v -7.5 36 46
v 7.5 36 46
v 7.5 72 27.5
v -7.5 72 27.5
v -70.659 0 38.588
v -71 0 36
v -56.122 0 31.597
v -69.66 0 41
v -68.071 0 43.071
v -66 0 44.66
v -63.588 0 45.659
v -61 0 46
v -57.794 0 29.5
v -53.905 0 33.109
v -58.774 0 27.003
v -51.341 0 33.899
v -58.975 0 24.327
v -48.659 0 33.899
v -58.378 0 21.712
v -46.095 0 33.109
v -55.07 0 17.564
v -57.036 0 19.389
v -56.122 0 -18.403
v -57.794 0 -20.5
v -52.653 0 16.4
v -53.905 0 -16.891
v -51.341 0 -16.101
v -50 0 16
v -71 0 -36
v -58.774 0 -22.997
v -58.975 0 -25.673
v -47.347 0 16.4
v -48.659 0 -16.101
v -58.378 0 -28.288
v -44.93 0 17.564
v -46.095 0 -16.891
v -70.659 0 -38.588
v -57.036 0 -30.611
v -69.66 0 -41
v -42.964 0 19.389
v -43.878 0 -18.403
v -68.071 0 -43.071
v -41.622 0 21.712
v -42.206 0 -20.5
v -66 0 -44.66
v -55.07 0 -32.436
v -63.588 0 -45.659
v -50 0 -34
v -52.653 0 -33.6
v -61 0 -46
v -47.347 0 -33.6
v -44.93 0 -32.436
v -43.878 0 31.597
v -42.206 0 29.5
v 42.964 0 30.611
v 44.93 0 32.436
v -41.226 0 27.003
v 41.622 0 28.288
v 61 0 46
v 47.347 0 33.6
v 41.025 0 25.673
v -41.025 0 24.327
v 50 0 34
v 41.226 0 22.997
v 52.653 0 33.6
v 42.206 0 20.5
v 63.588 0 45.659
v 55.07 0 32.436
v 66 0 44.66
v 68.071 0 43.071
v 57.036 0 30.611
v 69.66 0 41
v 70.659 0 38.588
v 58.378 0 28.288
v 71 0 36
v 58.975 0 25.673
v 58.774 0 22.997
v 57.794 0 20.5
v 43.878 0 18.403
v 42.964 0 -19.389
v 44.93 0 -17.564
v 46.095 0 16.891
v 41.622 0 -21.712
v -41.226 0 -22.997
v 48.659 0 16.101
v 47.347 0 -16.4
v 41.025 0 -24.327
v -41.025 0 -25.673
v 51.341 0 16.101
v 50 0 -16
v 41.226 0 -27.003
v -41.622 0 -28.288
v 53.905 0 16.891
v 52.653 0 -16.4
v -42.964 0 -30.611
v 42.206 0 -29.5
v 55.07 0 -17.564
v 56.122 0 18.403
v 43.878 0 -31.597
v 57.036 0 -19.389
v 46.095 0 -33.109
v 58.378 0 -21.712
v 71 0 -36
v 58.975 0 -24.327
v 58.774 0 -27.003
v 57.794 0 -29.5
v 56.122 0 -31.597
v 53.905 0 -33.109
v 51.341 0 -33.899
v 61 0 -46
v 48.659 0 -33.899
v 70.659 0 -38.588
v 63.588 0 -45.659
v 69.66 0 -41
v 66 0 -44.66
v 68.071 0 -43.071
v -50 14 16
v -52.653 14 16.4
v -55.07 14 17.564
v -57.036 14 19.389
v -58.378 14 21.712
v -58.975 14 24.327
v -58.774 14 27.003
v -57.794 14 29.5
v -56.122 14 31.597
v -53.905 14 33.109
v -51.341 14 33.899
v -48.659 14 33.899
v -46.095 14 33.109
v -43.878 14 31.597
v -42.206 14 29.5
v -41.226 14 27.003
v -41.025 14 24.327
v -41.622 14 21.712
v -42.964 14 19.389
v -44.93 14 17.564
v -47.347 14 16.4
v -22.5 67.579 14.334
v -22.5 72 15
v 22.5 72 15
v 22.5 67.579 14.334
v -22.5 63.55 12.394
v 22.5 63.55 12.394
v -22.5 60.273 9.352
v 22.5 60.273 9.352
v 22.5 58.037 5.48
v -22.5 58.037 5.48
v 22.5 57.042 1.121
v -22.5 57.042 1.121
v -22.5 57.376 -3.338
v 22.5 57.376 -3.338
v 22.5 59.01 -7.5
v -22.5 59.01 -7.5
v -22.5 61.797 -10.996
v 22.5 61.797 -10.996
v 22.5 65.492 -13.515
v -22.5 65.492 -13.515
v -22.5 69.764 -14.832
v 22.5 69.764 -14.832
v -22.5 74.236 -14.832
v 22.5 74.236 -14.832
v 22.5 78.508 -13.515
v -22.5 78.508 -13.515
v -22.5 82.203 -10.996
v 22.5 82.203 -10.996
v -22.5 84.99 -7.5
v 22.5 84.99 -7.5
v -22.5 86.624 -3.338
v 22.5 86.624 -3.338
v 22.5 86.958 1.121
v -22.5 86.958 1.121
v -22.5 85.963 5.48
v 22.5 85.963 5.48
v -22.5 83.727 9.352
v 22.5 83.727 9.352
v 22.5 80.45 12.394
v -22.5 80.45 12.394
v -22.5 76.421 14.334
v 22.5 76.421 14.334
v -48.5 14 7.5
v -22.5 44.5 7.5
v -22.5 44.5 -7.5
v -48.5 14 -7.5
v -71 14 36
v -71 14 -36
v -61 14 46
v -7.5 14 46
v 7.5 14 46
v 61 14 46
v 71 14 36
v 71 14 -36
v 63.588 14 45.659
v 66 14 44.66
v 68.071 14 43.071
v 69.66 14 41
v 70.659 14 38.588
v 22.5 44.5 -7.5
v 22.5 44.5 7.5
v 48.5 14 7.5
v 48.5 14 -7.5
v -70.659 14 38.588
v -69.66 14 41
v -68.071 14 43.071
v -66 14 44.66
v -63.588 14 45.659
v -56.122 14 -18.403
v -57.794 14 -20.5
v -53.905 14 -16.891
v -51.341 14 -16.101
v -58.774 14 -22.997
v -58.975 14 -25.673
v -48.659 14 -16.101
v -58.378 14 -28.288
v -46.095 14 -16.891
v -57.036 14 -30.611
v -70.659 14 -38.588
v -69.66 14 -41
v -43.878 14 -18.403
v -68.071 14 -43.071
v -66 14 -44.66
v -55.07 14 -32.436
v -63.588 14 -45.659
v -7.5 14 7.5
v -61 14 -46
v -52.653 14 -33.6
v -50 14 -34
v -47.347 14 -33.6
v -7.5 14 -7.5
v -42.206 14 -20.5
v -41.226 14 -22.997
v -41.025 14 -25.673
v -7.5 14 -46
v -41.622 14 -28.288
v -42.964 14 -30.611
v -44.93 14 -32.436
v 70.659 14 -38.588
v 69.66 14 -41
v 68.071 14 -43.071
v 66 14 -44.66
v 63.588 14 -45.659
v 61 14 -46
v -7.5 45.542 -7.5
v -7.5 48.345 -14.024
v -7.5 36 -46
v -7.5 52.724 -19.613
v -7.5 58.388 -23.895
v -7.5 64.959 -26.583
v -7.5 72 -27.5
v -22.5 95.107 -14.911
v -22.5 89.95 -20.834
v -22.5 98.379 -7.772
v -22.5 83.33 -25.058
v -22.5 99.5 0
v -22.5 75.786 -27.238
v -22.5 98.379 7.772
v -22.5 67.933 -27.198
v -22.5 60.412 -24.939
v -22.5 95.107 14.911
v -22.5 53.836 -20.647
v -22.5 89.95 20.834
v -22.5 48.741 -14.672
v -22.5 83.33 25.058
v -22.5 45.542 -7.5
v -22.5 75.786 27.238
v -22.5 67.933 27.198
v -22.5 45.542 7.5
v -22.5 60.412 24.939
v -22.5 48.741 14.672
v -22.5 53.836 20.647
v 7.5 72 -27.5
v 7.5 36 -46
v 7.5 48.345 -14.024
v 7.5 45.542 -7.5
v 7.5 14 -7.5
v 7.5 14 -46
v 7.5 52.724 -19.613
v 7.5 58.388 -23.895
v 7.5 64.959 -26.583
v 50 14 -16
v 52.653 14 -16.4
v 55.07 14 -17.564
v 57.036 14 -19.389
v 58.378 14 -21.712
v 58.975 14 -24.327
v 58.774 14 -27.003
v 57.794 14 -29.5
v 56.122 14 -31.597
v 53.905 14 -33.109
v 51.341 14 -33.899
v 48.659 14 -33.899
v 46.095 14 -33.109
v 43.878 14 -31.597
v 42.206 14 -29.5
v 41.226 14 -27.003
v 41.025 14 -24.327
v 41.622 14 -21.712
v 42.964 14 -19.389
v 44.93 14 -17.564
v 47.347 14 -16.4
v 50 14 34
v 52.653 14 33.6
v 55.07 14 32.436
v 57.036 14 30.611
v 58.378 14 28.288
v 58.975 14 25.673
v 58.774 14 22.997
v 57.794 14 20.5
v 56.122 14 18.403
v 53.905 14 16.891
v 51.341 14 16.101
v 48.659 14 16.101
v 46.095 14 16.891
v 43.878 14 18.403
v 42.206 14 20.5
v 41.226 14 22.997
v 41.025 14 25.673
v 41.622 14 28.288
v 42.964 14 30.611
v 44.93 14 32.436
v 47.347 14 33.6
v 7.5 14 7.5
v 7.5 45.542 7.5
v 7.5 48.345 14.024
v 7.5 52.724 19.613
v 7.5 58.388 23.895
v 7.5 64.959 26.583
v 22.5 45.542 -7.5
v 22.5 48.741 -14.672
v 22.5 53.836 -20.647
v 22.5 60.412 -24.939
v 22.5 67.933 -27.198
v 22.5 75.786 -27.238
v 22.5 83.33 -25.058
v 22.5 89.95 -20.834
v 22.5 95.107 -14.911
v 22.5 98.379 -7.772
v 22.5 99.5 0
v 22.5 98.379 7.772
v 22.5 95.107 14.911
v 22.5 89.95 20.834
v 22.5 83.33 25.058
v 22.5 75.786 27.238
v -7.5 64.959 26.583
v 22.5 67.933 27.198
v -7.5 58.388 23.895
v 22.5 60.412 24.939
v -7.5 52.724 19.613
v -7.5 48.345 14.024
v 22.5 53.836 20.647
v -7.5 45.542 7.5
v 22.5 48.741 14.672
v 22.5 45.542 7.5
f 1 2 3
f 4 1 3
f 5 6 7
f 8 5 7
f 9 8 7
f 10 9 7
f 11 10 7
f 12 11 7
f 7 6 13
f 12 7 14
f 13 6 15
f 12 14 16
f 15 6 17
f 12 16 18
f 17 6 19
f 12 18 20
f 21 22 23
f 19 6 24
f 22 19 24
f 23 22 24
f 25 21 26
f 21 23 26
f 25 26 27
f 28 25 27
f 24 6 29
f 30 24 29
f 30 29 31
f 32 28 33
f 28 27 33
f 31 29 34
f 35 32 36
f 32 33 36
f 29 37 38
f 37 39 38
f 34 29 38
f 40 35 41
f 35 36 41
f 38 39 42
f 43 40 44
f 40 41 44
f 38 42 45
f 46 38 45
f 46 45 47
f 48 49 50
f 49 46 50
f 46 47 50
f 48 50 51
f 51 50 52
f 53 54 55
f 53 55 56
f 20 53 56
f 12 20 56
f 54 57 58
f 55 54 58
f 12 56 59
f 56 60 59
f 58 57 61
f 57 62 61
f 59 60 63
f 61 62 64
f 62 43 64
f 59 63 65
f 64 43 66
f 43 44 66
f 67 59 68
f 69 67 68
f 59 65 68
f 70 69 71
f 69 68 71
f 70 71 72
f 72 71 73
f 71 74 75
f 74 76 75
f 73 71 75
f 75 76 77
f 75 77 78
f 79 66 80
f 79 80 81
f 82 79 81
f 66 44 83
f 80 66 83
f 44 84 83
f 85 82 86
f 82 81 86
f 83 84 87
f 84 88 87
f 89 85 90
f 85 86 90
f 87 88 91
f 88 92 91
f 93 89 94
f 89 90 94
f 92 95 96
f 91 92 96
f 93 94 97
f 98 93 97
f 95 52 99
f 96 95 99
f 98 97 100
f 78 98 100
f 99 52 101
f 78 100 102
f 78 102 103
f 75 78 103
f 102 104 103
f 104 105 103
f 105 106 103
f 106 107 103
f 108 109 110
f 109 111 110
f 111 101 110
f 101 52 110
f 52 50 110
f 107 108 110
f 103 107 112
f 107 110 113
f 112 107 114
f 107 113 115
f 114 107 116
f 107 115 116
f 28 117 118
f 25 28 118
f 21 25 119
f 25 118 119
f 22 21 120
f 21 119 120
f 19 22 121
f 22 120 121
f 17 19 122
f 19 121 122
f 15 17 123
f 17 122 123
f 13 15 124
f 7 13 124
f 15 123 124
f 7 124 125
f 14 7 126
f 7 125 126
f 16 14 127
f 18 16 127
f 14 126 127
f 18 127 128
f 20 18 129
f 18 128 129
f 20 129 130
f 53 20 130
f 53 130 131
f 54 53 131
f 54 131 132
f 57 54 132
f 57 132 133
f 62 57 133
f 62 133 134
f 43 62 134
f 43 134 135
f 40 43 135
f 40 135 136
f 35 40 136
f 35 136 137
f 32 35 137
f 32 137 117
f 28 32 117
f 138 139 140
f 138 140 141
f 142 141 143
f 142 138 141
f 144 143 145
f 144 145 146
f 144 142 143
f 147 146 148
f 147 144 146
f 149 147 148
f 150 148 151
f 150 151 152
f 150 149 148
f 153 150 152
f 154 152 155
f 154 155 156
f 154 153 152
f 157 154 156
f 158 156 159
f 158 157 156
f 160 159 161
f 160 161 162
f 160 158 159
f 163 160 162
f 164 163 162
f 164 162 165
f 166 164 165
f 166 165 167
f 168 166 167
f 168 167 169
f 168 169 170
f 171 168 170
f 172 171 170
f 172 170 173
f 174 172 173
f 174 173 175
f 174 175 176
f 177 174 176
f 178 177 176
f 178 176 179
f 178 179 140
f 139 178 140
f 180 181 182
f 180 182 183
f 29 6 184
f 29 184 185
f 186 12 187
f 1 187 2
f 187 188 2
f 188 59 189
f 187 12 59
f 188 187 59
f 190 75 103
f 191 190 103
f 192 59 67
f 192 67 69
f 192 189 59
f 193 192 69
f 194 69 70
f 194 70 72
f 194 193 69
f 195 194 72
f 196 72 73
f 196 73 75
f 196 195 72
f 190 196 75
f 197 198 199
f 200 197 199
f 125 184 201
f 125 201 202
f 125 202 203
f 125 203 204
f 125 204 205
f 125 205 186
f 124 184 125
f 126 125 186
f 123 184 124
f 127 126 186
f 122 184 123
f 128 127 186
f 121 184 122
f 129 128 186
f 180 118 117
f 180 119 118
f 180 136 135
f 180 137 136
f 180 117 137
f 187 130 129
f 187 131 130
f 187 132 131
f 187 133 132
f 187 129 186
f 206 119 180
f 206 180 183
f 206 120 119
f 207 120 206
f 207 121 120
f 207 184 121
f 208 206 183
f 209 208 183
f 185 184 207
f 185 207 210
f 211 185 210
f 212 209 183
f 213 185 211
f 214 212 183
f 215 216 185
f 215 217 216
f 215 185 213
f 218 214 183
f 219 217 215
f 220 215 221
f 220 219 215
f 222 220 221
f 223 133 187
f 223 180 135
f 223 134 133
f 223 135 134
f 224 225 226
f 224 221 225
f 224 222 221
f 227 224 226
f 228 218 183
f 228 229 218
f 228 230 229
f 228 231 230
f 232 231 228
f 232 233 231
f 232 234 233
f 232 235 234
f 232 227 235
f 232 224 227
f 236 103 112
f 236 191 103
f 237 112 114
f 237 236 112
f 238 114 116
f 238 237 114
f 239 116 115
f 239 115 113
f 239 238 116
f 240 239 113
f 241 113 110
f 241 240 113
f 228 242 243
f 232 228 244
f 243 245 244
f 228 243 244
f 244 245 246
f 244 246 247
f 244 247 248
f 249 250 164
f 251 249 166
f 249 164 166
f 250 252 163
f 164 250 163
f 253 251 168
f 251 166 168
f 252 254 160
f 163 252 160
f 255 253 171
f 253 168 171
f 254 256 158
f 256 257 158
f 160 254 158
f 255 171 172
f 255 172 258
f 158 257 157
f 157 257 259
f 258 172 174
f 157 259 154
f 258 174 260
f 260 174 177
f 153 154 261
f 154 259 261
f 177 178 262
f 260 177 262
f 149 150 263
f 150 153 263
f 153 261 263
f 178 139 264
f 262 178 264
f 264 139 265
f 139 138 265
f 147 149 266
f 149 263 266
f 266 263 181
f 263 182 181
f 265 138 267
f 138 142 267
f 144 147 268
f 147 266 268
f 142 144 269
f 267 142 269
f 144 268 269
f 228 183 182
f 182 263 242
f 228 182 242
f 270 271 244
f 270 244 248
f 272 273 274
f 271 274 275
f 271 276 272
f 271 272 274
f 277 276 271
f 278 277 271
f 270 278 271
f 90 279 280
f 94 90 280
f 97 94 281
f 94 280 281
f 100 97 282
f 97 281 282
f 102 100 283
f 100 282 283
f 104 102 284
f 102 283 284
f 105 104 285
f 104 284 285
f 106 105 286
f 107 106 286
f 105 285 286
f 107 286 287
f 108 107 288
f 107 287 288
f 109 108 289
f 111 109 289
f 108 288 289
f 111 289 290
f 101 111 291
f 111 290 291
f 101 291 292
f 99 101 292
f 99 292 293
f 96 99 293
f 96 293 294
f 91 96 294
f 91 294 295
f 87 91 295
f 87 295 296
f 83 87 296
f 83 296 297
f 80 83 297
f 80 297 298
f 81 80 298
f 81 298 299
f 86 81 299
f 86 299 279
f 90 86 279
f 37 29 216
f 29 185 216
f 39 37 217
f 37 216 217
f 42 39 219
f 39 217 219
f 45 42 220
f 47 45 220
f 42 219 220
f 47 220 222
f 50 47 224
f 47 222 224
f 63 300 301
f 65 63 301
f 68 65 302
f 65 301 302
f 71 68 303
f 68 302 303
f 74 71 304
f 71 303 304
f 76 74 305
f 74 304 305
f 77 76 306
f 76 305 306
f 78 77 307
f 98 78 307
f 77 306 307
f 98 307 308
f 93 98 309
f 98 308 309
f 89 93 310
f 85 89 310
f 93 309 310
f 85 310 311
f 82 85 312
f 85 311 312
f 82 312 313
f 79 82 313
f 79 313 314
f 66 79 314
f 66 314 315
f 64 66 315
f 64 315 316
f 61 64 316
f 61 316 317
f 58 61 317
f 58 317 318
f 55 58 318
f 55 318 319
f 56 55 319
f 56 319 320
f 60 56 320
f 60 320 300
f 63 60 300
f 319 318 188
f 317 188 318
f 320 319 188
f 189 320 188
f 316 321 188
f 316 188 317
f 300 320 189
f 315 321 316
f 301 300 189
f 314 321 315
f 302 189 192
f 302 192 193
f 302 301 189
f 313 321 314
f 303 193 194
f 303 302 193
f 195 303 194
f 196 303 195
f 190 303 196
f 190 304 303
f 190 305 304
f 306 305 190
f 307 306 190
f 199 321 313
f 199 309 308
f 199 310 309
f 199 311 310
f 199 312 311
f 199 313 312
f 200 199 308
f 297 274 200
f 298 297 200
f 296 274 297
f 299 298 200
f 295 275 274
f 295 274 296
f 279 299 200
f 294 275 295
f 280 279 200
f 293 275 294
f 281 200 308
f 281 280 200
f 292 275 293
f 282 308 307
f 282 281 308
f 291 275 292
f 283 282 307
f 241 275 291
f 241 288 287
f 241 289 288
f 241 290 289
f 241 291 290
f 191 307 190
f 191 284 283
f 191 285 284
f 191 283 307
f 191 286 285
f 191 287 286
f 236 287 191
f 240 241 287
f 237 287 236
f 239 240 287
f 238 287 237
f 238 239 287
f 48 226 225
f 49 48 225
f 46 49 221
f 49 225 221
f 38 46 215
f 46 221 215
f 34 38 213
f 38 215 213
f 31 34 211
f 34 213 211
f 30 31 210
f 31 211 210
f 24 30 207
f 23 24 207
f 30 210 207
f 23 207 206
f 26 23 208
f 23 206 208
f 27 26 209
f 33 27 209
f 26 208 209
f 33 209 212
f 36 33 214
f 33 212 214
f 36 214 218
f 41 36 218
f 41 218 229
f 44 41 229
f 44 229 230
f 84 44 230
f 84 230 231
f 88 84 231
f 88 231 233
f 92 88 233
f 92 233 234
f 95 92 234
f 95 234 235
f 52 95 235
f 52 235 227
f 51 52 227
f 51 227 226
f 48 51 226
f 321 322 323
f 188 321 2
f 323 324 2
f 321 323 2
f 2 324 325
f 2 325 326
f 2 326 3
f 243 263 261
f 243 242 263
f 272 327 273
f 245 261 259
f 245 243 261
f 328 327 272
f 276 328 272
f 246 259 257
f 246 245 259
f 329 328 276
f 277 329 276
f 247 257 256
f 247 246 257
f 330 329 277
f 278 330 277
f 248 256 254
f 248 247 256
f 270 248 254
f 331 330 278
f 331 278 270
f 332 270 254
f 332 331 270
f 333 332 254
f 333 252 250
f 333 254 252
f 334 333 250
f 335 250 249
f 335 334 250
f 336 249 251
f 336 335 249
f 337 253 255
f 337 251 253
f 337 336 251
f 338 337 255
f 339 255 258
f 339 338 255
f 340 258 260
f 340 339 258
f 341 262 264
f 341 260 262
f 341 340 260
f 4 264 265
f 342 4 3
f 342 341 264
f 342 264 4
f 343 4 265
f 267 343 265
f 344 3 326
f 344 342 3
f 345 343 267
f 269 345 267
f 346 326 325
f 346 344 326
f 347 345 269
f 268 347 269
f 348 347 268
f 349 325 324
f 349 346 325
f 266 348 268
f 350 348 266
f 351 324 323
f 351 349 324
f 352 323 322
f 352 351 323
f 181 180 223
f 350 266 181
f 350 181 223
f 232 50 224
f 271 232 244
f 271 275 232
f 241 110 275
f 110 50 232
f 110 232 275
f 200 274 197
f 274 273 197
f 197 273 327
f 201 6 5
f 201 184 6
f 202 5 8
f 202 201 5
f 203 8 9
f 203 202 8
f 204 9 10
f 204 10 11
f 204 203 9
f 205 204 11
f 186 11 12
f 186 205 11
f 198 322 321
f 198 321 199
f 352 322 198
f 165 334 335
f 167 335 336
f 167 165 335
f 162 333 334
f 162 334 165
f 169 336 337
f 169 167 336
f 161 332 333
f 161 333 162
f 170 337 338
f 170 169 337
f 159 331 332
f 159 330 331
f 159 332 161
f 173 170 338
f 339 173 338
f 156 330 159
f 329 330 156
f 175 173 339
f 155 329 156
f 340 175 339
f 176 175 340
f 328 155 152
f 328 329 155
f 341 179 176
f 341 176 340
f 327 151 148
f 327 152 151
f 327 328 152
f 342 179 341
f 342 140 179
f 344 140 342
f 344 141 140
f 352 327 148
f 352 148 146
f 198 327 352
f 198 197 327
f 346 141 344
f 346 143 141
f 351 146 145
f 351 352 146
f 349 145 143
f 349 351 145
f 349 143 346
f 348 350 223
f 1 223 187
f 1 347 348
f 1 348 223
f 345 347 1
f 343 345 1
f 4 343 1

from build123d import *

# Parameters (mm, degrees)
SKETCH1_W           = 142
SKETCH1_H           = 92
BOSS_EXTRUDE1_DEPTH = 14
FILLET1_R           = 10
SKETCH2_R           = 27.5
SKETCH2_R_2         = 15
BOSS_EXTRUDE2_DEPTH = 22.5
BOSS_EXTRUDE3_DEPTH = 7.5
BOSS_EXTRUDE4_DEPTH = 7.5
SKETCH5_R           = 9
CUT_EXTRUDE1_DEPTH  = 121.279881942


with BuildPart() as part:
    # Sketch1 → Boss-Extrude1 (new body)
    with BuildSketch(Plane(origin=(0, 0, 0), x_dir=(1, 0, 0), z_dir=(0, 1, 0))):
        Rectangle(SKETCH1_W, SKETCH1_H)
    extrude(amount=BOSS_EXTRUDE1_DEPTH)

    # Fillet1
    fillet1_edges = [part.edges().sort_by_distance(p)[0] for p in [
        (-71, 7, -46),
        (71, 7, -46),
        (71, 7, 46),
        (-71, 7, 46),
    ]]
    fillet(fillet1_edges, radius=FILLET1_R)



with BuildPart() as body_2:
    # Sketch2 → Boss-Extrude2 (new, symmetric)
    with BuildSketch(Plane(origin=(0, 0, 0), x_dir=(0, 0, -1), z_dir=(1, 0, 0))):
        with Locations(Location((0, 72, 0), (0, 0, 180))):
            Circle(SKETCH2_R)
        with Locations(Location((0, 72, 0), (0, 0, 180))):
            Circle(SKETCH2_R_2, mode=Mode.SUBTRACT)
    extrude(amount=BOSS_EXTRUDE2_DEPTH, both=True)


with BuildPart() as part_1:
    add(part.part)

    add(body_2.part)  # Boss-Extrude3 merges body 2
    # Sketch3 → Boss-Extrude3 (add, symmetric)
    with BuildSketch(Plane.XY):
        Polygon((0, 49.5), (-22.5, 49.5), (-22.5, 44.5), (-48.5, 14), (-48.5, 6.529967444), (0, 6.529967444), (0, 44.5), align=None)
    extrude(amount=BOSS_EXTRUDE3_DEPTH, both=True)

    # Mirror1: part across plane


with BuildPart() as part_2:
    add(part_1.part)
    add(part_1.part.mirror(Plane(origin=(0, 0, 0), x_dir=(0, 0, 1), z_dir=(1, 0, 0))))

    # Sketch4 → Boss-Extrude4 (add, symmetric)
    with BuildSketch(Plane(origin=(0, 0, 0), x_dir=(0, 0, -1), z_dir=(1, 0, 0))):
        with BuildLine():
            Line((7.5, 14), (36, 14))
            Line((36, 14), (46, 14))
            Line((46, 14), (46, 36))
            Line((46, 36), (27.5, 72))
            ThreePointArc((27.5, 72), (21.937410968, 55.416876048), (7.5, 45.542486889))
            Line((7.5, 45.542486889), (7.5, 44.5))
            Line((7.5, 44.5), (7.5, 14))
        make_face()
    extrude(amount=BOSS_EXTRUDE4_DEPTH, both=True)

    # Mirror3: part across plane


with BuildPart() as part_3:
    add(part_2.part)
    add(part_2.part.mirror(Plane.XY))

    # Sketch5 → Cut-Extrude1 (cut, through all)
    with BuildSketch(Plane(origin=(0, 14, 0), x_dir=(1, 0, 0), z_dir=(0, 1, 0))):
        with Locations(Location((50, -25, 0), (0, 0, 270))):
            Circle(SKETCH5_R)
        with Locations(Location((50, 25, 0), (0, 0, 270))):
            Circle(SKETCH5_R)
        with Locations(Location((-50, 25, 0), (0, 0, 90))):
            Circle(SKETCH5_R)
        with Locations(Location((-50, -25, 0), (0, 0, 90))):
            Circle(SKETCH5_R)
    extrude(amount=-CUT_EXTRUDE1_DEPTH, mode=Mode.SUBTRACT)


solid = part_3.part
